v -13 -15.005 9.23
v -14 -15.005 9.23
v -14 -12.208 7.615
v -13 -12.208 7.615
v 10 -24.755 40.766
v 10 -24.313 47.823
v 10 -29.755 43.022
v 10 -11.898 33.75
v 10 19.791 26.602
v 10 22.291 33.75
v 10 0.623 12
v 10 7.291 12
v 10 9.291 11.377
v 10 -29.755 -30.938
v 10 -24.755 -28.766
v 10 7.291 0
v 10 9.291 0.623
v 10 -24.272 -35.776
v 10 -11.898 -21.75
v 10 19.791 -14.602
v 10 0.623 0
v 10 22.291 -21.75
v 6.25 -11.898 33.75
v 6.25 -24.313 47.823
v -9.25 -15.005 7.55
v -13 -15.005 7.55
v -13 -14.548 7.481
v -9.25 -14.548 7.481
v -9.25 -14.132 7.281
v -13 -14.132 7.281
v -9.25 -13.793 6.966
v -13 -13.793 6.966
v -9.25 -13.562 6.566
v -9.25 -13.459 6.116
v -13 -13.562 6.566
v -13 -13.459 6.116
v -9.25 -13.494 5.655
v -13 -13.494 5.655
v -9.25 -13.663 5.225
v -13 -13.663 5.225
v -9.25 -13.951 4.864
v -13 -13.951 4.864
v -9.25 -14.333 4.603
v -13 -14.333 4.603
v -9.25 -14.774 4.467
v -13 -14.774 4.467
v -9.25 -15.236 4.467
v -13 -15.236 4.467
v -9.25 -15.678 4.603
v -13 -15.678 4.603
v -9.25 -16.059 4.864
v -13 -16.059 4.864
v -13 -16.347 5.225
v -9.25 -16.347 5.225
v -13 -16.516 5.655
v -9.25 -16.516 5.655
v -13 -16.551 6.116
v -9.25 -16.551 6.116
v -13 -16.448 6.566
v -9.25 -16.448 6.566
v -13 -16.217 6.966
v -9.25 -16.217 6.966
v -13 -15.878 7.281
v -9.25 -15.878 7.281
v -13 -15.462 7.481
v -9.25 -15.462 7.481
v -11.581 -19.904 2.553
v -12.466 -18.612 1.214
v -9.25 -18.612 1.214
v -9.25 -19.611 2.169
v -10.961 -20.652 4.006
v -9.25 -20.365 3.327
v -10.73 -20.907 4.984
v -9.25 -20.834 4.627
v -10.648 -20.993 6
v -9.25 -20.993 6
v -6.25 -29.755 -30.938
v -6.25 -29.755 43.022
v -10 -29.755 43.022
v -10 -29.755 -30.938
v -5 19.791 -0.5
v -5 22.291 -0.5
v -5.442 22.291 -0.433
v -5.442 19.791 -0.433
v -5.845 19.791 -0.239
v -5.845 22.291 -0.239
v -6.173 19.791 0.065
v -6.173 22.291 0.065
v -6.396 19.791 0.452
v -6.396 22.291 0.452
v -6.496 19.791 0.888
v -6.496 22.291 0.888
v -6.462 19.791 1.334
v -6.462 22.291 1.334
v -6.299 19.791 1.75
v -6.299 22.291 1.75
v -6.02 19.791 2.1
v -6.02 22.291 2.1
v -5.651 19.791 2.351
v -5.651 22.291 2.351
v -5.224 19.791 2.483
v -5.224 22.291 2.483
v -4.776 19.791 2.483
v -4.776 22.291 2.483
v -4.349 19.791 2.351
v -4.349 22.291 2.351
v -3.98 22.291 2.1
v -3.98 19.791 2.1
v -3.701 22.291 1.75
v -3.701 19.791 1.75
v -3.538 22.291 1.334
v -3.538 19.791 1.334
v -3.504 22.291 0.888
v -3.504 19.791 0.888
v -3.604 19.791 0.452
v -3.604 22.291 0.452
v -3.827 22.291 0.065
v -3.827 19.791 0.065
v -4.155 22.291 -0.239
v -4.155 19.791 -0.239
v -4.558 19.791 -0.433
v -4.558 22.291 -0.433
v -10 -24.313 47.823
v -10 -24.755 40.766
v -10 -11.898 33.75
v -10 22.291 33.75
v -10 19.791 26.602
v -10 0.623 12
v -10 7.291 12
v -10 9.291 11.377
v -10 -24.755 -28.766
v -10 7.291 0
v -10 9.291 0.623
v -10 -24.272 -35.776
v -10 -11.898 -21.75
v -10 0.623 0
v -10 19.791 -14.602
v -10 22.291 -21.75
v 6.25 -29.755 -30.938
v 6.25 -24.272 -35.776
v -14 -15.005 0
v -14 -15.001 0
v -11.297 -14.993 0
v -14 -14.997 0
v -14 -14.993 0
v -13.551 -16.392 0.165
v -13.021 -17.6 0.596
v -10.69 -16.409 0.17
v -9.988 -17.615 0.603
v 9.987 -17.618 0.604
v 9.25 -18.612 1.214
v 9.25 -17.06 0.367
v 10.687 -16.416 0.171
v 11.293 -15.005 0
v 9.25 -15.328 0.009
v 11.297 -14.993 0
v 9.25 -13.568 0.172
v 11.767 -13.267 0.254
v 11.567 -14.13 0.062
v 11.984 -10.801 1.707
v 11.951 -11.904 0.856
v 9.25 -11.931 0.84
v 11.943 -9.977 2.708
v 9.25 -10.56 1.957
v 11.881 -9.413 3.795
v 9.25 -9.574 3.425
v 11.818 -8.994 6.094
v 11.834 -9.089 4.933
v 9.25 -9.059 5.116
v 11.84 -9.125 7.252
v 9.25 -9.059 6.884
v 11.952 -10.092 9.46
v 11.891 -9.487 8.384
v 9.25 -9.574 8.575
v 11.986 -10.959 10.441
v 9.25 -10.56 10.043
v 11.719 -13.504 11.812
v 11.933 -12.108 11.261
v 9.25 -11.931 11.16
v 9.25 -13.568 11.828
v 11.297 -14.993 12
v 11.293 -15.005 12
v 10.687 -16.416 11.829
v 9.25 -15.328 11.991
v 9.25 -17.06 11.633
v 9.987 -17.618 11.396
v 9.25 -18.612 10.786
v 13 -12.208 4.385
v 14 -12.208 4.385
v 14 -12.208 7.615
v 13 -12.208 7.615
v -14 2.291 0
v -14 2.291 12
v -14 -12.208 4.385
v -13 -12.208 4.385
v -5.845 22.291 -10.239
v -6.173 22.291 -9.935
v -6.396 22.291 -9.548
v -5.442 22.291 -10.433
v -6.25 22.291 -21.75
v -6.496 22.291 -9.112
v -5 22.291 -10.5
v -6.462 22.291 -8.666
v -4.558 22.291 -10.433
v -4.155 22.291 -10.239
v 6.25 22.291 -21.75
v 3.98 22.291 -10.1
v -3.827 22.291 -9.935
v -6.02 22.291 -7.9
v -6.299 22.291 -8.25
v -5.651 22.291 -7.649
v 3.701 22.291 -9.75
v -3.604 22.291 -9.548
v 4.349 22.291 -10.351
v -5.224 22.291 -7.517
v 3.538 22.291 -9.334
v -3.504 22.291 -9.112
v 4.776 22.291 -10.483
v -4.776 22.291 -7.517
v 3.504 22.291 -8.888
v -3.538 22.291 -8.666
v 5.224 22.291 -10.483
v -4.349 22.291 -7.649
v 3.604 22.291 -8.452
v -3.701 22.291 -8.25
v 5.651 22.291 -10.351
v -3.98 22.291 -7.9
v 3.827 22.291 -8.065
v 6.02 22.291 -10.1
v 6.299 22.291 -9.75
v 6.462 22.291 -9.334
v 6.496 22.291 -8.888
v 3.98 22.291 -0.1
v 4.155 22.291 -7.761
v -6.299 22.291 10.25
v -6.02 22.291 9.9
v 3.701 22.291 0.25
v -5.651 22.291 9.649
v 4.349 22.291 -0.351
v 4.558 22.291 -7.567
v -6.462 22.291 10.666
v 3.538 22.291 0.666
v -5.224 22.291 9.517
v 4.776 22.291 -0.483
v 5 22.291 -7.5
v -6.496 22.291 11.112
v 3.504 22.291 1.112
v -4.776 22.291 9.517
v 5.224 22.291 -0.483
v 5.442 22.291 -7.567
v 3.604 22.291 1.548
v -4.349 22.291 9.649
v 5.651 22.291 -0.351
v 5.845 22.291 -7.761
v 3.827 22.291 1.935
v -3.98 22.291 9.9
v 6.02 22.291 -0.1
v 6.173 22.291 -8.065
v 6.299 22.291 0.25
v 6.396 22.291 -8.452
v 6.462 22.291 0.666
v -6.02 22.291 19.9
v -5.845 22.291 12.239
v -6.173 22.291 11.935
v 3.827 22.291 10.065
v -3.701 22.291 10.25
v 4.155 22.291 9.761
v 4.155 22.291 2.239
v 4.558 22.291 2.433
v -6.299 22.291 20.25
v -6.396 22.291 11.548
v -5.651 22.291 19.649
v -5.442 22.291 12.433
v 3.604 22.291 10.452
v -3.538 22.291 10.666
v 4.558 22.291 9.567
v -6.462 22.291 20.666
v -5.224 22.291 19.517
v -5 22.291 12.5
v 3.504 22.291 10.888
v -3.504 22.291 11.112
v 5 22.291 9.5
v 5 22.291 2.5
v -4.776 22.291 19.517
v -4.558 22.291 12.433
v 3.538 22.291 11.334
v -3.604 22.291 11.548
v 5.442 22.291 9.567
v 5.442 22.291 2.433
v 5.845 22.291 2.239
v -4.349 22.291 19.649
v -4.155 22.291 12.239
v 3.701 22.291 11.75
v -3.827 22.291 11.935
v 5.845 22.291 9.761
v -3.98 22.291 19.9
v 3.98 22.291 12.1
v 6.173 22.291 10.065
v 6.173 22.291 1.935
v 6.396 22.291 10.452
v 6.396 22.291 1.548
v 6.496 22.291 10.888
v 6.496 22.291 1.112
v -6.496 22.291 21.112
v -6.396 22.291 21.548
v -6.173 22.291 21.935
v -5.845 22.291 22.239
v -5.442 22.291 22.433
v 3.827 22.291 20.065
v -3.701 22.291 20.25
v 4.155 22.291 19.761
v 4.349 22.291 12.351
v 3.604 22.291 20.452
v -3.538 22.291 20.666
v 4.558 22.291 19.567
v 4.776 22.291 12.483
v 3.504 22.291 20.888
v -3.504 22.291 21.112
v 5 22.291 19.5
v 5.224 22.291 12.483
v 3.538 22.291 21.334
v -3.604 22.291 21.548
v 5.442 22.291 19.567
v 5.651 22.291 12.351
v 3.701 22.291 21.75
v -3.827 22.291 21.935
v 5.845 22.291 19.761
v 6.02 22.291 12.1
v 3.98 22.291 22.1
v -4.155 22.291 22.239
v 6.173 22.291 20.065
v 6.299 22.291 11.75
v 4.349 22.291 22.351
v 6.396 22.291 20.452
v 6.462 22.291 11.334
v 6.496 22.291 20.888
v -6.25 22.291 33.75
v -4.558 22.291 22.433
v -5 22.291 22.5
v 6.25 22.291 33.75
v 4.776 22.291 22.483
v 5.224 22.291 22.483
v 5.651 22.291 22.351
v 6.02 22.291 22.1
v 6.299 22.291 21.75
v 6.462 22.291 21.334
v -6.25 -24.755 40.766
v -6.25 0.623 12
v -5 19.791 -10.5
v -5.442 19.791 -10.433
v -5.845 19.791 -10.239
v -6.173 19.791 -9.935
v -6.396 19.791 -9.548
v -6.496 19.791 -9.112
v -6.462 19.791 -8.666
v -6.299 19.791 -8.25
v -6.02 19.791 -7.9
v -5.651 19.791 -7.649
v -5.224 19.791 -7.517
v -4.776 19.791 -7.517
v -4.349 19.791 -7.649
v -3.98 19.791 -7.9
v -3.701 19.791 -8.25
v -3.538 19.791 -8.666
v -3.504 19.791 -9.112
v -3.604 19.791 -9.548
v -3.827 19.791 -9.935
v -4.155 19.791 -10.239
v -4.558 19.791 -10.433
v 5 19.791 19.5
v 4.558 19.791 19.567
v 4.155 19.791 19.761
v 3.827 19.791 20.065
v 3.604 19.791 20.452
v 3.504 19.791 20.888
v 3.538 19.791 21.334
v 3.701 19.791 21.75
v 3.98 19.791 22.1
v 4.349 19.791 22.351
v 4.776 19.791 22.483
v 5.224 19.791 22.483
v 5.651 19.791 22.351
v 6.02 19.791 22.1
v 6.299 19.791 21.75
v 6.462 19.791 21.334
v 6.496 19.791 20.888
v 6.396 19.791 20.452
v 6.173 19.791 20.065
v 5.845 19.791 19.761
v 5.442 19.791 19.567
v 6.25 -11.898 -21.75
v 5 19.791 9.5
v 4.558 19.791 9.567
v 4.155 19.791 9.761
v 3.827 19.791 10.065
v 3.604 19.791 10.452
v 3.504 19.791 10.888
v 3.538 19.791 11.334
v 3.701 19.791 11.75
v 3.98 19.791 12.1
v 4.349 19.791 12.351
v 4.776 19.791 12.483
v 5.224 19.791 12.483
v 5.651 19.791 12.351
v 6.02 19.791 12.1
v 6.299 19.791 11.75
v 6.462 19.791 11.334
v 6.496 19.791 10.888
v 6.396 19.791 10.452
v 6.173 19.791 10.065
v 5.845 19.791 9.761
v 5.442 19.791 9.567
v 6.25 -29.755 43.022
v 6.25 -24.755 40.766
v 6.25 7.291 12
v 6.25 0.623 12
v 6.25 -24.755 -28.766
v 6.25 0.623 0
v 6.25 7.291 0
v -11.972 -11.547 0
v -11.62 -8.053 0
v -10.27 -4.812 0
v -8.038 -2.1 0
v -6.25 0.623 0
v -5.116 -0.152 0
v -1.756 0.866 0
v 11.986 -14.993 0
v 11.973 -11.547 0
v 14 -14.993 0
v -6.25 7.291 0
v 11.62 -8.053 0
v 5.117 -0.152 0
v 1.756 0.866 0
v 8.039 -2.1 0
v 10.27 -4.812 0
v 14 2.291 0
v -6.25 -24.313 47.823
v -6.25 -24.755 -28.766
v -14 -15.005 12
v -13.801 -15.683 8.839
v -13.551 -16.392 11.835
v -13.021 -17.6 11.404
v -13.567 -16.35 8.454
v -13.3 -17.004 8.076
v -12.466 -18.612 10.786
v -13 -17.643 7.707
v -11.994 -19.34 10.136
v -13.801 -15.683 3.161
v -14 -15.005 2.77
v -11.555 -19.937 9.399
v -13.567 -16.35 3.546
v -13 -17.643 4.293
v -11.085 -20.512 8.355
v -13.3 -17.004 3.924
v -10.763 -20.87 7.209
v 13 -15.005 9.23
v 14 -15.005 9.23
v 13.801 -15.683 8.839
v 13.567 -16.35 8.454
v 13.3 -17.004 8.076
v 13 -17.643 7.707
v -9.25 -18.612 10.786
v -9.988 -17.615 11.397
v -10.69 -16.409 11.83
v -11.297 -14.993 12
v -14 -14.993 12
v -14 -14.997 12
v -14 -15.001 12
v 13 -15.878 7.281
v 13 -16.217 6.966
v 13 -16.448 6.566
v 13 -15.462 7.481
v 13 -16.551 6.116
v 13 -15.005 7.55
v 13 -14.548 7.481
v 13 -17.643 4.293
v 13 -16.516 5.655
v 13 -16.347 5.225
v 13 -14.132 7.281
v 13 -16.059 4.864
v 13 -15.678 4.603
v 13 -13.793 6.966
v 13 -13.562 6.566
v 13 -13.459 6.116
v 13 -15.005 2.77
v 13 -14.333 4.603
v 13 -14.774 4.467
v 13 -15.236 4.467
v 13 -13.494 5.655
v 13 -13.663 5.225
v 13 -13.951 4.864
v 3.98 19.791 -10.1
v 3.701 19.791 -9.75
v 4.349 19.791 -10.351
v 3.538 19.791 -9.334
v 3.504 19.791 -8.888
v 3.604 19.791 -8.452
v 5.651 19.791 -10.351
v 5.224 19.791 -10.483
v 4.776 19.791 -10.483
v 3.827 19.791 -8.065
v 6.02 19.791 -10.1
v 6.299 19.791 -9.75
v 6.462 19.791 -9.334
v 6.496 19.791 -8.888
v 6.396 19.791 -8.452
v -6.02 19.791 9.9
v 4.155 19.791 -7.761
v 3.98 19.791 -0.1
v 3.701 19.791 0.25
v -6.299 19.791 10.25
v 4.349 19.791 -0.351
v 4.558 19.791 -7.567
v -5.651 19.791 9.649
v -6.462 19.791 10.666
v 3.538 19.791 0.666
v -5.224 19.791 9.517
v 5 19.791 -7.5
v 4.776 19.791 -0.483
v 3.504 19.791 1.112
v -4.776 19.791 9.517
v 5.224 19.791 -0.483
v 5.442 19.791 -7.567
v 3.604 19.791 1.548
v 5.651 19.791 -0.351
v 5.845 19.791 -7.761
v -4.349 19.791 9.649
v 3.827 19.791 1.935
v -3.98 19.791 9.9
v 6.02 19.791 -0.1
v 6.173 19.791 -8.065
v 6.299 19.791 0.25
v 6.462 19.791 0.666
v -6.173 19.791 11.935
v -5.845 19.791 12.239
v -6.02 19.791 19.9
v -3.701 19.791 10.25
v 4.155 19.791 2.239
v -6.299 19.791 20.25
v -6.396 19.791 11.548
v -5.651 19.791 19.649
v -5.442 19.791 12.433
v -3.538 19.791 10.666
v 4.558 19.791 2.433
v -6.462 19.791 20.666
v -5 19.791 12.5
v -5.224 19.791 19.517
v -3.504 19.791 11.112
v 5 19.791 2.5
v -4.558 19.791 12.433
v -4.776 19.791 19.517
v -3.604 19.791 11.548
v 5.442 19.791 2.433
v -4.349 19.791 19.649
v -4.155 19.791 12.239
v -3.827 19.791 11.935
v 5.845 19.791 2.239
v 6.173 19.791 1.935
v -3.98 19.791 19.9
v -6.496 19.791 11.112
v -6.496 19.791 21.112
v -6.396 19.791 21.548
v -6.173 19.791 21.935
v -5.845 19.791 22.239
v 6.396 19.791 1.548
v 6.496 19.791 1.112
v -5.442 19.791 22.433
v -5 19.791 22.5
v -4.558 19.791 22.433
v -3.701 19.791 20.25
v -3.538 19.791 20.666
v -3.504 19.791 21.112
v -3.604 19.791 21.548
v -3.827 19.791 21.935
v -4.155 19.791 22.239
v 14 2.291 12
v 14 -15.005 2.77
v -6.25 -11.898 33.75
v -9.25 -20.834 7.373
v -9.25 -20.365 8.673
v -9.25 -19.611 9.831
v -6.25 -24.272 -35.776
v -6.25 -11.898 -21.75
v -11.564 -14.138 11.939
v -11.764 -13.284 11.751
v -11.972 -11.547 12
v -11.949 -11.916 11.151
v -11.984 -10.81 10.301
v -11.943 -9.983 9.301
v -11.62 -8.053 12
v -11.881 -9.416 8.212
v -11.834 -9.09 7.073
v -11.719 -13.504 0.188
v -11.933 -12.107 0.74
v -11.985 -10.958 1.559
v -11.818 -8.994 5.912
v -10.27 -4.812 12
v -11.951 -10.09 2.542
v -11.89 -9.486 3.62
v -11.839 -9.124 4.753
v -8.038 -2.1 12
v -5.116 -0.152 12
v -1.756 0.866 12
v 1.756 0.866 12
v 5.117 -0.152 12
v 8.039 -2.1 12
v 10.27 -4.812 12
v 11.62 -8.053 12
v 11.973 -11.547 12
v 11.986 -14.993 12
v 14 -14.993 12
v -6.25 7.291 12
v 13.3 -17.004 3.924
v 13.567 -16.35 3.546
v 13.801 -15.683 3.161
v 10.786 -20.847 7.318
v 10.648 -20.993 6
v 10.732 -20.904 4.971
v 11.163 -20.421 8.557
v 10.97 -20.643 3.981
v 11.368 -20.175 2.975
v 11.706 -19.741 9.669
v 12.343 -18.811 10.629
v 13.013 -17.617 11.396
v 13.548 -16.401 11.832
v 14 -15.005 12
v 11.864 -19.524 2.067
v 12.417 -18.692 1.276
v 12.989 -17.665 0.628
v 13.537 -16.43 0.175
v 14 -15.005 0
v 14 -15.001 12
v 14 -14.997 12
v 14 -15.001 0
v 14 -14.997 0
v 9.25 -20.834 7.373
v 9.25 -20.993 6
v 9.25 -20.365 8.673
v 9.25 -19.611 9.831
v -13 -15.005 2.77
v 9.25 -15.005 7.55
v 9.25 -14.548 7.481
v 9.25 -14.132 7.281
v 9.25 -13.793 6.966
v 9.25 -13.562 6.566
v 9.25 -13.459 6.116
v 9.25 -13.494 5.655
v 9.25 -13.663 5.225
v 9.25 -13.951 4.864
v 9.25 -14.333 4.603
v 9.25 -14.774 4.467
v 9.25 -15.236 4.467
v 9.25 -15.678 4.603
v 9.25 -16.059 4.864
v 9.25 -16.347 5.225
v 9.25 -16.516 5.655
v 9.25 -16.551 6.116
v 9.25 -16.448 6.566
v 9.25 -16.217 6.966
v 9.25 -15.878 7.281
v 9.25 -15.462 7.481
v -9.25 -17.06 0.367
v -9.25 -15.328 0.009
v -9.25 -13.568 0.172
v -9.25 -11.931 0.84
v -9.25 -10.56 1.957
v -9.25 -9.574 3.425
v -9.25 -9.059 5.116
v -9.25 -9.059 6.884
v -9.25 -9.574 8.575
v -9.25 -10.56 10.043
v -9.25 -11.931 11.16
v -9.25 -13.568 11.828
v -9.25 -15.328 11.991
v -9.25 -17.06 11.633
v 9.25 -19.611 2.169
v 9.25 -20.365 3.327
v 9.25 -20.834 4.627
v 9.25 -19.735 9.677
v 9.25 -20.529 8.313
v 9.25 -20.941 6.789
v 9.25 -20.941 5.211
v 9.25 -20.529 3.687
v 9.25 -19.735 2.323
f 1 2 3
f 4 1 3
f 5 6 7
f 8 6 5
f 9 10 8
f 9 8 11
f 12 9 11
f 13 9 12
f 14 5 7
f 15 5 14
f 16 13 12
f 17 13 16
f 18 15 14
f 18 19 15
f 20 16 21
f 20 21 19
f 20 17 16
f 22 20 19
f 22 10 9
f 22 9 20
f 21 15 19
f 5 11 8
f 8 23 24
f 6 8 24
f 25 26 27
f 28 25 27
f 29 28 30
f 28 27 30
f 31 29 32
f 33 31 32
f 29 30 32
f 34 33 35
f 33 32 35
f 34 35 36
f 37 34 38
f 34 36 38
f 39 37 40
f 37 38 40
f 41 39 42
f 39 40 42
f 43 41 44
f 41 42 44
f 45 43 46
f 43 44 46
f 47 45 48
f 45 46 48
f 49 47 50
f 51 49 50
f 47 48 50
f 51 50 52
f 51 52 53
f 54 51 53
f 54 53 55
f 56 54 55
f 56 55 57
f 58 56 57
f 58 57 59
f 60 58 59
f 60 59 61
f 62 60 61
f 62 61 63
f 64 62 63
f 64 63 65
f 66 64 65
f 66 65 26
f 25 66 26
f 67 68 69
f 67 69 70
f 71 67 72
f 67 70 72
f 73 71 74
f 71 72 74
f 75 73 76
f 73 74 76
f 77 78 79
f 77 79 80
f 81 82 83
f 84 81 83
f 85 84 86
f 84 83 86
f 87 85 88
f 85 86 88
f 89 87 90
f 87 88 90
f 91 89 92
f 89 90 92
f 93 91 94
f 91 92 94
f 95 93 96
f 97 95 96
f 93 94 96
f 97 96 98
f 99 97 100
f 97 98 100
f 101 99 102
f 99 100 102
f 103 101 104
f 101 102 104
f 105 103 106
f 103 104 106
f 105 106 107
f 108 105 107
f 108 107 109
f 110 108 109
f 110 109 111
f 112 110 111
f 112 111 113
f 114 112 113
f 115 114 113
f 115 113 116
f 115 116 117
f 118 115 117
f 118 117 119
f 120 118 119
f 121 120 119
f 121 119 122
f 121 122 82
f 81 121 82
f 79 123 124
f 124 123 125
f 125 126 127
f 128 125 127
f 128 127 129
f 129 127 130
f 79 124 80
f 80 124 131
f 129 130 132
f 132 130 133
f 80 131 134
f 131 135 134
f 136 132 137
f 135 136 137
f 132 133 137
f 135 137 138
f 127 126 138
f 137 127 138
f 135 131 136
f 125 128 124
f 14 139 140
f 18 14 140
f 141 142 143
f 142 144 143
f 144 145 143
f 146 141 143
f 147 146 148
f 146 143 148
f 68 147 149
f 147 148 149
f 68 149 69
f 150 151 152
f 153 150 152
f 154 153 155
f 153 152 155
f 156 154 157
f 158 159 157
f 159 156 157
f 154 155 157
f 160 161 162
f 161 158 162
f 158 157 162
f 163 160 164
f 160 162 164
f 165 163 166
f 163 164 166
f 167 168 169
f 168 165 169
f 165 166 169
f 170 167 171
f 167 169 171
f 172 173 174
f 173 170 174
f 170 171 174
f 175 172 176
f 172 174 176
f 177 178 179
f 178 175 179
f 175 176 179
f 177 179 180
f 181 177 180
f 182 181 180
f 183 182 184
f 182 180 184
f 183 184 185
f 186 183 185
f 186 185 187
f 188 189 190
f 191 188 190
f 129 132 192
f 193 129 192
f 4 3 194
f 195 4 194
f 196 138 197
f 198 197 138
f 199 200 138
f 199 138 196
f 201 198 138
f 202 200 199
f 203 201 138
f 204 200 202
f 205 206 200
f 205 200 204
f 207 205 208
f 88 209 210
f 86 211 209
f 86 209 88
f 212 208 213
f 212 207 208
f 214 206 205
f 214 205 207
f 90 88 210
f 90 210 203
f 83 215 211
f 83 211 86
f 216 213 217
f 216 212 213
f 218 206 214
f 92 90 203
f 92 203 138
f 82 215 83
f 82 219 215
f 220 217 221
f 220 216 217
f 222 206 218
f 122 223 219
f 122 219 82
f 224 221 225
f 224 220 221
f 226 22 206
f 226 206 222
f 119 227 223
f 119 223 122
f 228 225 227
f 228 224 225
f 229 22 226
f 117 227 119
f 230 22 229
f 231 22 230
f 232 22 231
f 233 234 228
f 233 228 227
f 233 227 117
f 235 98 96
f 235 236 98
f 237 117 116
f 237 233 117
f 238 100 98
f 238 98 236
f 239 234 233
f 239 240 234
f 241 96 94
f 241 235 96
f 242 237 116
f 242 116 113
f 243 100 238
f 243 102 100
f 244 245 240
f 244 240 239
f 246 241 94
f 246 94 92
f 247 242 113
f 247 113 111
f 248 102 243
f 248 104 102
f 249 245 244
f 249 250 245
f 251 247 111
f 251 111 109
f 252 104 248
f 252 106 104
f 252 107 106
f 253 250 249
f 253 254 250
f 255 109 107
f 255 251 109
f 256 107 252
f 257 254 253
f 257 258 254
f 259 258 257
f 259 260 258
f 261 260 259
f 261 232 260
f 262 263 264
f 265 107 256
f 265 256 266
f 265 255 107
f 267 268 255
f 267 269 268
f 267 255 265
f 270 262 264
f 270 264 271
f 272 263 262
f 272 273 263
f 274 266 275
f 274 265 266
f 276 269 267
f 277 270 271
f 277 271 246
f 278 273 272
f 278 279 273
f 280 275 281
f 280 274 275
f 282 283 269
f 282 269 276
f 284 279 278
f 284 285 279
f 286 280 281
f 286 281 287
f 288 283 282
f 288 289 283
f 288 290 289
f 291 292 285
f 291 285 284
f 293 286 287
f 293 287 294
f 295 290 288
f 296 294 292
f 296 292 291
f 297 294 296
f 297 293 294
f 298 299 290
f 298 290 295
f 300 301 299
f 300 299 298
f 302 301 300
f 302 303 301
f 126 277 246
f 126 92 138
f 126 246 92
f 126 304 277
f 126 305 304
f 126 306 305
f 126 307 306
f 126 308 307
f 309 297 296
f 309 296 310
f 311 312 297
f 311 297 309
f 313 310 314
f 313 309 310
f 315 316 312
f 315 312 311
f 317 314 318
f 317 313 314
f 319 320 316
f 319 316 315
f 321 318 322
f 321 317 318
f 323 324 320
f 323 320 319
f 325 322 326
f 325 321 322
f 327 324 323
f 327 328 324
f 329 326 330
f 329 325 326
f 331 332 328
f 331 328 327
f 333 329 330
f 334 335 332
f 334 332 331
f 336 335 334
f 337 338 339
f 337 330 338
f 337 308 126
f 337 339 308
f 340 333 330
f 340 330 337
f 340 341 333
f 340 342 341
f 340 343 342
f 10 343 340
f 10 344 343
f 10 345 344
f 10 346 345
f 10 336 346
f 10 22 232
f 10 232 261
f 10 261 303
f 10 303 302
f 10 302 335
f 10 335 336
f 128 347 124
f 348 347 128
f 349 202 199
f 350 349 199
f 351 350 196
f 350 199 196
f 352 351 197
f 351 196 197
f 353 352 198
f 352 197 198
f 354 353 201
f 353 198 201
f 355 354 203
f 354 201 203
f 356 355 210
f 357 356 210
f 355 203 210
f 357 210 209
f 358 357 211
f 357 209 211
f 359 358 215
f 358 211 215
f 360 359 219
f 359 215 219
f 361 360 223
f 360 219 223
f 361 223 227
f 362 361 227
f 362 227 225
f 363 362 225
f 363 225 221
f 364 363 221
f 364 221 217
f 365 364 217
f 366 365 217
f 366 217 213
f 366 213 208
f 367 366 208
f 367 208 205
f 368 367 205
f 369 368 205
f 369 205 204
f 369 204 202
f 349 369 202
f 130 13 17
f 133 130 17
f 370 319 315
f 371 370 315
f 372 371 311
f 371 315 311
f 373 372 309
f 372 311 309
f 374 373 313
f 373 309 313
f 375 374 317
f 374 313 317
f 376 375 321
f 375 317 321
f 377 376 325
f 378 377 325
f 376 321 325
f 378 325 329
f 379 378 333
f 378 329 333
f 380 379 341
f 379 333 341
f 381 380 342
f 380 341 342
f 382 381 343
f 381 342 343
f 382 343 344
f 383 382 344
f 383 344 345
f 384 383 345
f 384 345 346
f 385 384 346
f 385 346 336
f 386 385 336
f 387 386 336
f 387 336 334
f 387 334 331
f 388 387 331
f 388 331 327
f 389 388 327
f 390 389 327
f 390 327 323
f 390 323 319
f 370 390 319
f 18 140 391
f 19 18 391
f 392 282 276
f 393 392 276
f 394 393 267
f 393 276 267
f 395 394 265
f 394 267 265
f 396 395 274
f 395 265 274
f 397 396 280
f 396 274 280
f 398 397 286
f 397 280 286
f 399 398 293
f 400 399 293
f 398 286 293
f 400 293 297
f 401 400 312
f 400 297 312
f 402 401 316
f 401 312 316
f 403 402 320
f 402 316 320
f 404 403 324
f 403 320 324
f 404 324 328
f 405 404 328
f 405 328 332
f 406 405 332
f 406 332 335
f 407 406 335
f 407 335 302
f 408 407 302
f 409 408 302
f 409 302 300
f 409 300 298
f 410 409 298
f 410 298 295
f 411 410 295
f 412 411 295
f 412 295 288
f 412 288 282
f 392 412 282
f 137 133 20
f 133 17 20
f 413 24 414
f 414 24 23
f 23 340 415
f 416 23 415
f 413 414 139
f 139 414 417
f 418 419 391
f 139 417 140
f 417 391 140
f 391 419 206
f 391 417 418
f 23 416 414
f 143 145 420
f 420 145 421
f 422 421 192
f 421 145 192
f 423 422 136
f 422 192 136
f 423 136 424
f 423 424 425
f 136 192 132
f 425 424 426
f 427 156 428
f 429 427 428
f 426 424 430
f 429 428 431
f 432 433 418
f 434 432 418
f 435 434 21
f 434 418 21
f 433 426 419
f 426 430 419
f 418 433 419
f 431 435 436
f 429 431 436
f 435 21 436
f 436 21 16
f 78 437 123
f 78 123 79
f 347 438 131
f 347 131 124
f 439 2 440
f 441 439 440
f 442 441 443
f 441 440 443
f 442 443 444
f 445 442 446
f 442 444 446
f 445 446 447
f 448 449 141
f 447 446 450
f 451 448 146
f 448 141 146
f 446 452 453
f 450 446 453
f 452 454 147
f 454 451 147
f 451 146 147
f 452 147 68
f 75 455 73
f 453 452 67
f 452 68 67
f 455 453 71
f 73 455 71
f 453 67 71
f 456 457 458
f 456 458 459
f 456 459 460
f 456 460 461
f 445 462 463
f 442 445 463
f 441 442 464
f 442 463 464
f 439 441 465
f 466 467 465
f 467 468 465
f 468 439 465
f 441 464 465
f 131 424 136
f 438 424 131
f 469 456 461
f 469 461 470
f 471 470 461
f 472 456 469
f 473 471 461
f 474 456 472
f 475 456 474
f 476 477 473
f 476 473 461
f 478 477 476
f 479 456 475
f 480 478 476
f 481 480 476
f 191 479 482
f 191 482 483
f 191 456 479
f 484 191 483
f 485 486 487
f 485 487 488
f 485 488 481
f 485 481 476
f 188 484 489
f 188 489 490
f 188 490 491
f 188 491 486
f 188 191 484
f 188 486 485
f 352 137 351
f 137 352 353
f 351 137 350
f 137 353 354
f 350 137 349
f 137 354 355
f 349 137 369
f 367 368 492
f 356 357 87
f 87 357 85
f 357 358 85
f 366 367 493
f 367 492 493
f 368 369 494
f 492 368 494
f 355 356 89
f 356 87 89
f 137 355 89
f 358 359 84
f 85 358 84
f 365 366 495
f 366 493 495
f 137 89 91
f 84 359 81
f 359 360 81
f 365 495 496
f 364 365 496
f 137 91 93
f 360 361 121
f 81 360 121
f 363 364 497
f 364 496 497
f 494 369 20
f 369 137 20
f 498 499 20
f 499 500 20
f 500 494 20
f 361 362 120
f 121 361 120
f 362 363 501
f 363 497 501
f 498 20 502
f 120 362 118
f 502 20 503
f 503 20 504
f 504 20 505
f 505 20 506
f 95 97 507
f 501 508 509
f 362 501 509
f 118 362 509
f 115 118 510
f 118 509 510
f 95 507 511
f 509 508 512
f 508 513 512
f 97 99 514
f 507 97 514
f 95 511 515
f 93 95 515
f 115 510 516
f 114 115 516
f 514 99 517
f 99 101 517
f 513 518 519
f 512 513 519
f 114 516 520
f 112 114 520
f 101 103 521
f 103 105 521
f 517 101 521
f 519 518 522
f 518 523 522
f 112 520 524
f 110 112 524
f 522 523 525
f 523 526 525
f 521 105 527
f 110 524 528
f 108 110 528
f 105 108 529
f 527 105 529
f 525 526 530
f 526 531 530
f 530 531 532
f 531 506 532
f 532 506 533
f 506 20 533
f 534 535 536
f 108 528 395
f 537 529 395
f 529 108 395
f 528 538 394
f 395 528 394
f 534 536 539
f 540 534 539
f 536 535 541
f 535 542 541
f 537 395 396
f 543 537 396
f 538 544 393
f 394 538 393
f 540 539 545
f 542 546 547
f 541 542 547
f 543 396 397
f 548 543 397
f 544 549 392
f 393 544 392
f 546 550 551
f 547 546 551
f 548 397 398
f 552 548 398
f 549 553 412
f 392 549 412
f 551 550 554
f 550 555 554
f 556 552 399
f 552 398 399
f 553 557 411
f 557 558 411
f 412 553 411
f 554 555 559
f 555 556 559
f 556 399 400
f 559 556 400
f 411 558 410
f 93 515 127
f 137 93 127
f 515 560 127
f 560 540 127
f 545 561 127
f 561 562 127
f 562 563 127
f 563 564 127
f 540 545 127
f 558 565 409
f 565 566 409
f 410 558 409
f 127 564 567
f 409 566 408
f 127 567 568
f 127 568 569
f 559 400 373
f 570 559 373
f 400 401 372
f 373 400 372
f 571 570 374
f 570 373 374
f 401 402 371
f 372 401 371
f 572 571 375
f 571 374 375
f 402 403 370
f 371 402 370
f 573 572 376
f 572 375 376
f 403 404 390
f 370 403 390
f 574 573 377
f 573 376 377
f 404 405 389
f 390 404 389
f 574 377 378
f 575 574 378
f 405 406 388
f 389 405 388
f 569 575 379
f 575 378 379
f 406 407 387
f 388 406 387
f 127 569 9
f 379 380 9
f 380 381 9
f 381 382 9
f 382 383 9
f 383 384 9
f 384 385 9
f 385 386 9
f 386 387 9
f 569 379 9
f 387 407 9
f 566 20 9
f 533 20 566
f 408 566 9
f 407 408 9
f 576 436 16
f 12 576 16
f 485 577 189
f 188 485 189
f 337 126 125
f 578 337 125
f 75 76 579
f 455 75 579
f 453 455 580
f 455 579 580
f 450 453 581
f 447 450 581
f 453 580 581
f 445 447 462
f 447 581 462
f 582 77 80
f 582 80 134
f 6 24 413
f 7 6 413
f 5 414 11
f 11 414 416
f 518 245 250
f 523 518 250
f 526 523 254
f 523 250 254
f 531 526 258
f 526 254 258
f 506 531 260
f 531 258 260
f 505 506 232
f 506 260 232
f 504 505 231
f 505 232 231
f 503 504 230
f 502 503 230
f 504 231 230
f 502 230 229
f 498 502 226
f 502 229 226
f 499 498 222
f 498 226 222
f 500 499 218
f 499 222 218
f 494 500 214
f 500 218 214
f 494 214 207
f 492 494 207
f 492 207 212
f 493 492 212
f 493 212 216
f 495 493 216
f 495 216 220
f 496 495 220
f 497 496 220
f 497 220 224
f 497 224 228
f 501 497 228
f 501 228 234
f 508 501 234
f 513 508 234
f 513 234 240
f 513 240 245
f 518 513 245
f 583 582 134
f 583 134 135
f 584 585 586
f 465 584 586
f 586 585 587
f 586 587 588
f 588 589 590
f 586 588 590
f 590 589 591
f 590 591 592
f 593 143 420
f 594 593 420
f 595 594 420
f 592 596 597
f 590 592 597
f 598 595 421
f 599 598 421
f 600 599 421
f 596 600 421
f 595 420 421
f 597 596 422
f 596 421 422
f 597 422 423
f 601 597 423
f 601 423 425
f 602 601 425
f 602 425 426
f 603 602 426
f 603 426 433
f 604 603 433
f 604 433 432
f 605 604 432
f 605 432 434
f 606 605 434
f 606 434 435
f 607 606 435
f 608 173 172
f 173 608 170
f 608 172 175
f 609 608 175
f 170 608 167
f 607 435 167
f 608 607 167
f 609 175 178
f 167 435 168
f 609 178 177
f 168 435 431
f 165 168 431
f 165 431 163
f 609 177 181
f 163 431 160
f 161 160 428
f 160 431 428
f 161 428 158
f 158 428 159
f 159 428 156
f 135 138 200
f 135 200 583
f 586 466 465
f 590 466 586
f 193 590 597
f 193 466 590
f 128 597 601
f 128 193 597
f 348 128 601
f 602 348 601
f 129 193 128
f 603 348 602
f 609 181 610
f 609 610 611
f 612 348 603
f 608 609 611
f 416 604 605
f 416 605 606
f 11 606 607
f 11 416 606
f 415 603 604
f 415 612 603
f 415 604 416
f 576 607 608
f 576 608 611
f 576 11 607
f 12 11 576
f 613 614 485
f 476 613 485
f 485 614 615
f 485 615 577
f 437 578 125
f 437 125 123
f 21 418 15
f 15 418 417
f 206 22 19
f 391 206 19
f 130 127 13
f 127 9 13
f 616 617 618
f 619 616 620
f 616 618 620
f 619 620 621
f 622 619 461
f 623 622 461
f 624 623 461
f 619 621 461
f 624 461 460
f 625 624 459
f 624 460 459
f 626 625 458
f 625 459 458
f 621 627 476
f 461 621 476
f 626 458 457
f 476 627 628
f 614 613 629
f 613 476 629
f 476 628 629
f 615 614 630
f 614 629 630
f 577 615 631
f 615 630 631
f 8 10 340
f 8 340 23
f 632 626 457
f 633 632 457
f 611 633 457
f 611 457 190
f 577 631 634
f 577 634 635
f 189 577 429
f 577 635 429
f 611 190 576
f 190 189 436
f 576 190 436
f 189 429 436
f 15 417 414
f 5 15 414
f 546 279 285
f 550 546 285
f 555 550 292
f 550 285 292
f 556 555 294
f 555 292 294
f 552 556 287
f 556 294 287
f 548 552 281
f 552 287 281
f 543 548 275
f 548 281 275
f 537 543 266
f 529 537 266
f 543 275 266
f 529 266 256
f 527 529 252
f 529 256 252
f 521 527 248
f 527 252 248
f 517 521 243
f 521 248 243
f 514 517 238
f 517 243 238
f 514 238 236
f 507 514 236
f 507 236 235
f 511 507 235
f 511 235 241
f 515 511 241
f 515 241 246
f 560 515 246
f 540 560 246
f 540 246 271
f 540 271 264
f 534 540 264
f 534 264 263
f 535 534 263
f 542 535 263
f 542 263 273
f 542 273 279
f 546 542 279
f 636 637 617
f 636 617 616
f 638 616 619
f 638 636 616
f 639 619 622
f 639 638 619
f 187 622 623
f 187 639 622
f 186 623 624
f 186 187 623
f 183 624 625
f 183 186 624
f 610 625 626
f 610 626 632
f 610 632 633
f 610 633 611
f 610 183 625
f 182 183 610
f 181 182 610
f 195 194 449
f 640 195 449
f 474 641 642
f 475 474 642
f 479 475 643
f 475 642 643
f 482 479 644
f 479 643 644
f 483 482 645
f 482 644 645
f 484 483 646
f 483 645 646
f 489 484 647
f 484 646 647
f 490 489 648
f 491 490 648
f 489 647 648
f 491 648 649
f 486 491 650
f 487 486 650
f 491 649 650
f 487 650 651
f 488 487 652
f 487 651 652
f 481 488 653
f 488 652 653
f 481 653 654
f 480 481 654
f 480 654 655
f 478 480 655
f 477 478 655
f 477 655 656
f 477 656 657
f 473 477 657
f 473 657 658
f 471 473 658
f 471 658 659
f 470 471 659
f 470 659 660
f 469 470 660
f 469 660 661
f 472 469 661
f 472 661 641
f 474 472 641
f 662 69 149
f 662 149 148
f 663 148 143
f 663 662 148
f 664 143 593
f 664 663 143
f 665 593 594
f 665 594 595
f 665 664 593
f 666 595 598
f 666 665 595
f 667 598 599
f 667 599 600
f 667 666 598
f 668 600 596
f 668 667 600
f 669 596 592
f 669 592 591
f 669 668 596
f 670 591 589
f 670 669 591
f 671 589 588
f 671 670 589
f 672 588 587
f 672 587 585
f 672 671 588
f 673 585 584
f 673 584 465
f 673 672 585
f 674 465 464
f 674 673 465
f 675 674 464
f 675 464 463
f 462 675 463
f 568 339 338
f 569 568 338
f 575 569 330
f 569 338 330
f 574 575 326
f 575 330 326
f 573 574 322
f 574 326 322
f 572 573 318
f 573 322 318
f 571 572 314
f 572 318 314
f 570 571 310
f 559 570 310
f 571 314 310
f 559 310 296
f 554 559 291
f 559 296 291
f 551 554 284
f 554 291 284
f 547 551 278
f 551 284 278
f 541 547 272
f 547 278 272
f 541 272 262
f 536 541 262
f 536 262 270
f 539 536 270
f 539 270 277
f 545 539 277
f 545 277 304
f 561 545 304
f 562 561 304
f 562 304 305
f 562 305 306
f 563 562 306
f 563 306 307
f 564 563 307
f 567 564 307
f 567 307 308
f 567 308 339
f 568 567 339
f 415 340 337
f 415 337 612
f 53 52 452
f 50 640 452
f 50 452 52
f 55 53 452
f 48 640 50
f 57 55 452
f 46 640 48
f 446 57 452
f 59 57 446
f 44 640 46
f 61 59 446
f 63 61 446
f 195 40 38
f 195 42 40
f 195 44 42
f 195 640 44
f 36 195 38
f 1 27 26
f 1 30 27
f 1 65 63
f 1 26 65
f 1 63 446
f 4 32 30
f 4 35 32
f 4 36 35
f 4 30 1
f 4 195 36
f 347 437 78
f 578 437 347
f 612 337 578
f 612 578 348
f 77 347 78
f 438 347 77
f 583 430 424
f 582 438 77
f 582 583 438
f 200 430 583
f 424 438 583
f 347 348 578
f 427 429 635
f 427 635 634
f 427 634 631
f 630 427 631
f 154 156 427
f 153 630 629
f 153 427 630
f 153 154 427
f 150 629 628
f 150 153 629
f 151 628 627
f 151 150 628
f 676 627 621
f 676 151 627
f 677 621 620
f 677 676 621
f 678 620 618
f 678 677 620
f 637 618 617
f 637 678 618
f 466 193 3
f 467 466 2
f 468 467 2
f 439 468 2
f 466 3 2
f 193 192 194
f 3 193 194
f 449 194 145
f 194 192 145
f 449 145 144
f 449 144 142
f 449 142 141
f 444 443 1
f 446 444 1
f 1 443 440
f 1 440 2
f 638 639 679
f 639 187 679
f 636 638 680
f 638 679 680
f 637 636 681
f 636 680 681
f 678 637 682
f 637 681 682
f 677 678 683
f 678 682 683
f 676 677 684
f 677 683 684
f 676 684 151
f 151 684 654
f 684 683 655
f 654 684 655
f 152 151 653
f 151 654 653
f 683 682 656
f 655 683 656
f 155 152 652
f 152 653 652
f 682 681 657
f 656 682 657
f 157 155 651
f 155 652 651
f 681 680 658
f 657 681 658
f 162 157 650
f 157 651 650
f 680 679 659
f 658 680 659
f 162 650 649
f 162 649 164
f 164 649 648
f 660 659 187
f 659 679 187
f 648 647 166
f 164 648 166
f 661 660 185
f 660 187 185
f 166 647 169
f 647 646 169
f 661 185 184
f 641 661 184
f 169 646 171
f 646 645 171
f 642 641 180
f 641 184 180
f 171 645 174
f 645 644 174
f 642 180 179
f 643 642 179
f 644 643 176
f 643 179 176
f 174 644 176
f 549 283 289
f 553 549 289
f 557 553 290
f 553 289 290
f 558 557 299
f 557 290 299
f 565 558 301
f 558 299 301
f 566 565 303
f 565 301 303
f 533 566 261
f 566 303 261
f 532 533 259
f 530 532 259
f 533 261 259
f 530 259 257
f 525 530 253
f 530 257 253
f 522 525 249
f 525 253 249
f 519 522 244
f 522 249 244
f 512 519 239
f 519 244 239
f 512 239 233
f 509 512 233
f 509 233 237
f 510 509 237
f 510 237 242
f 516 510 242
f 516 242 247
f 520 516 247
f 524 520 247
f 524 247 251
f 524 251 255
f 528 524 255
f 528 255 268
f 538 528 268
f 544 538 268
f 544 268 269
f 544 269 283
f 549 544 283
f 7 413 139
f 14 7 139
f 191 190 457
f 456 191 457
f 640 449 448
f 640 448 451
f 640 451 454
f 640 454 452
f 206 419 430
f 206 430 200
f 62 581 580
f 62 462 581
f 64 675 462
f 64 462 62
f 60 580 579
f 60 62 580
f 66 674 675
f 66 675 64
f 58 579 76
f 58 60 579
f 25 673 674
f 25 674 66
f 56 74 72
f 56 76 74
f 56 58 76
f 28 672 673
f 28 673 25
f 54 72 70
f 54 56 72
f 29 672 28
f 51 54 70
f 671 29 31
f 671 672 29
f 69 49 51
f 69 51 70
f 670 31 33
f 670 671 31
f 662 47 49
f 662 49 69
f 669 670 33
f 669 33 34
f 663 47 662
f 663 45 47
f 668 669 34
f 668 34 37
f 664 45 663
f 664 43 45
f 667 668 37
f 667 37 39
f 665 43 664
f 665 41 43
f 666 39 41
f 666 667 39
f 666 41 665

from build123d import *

# Parameters (mm, degrees)
EXTRUDE_1_DEPTH      = 12
EXTRUDE_2_REACH      = 35.545
EXTRUDE_2_END_RADIUS = 11.985372339
SKETCH_2_R           = 6
MIRROR_START         = 9.249795062
MIRROR_1_DEPTH       = 2.735782315
MIRROR_1_2_DEPTH     = 0.000409876
CUT_EXTRUDE_1_DEPTH  = 34.545141776
CUT_EXTRUDE_2_DEPTH  = 1
CUT_EXTRUDE_3_DEPTH  = 1
MIRROR_START_2       = 9.250204938
MIRROR_3_DEPTH       = 5.749795062
SKETCH_6_R           = 1.55
CUT_EXTRUDE_4_DEPTH  = 37.245193425
SKETCH_12_W          = 20
SKETCH_12_H          = 12
EXTRUDE_4_DEPTH      = 5
EXTRUDE_5_DEPTH      = 10
EXTRUDE_6_DEPTH      = 12
EXTRUDE_7_DEPTH      = 3.75
EXTRUDE_8_DEPTH      = 3.75
SKETCH_21_R          = 1.5
CUT_EXTRUDE_5_DEPTH  = 3


with BuildPart() as part:
    # 스케치1 → 보스-돌출1 (new body)
    with BuildSketch(Plane.XY):
        with BuildLine():
            Line((14.000204938, 2.291069809), (-13.999795062, 2.291069809))
            Line((-13.999795062, 2.291069809), (-13.999795062, -6.939240191))
            Line((-13.999795062, -6.939240191), (-13.999795062, -15.005030191))
            ThreePointArc((-13.999795062, -15.005030191), (-12.699794, -18.209549332), (-10.647895062, -20.993190191))
            Line((-10.647895062, -20.993190191), (-9.249795062, -20.993190191))
            Line((-9.249795062, -20.993190191), (-9.249795062, -18.61185417))
            ThreePointArc((-9.249795062, -18.61185417), (-10.428409882, -16.897436148), (-11.292795062, -15.005030191))
            ThreePointArc((-11.292795062, -15.005030191), (0.000204938, 0.99497801), (11.293204938, -15.005030191))
            ThreePointArc((11.293204938, -15.005030191), (10.428819757, -16.897436148), (9.250204938, -18.61185417))
            Line((9.250204938, -18.61185417), (9.250204938, -20.993190191))
            Line((9.250204938, -20.993190191), (10.648304938, -20.993190191))
            ThreePointArc((10.648304938, -20.993190191), (12.700203875, -18.209549332), (14.000204938, -15.005030191))
            Line((14.000204938, -15.005030191), (14.000204938, -6.939240191))
            Line((14.000204938, -6.939240191), (14.000204938, 2.291069809))
        make_face()
    extrude(amount=EXTRUDE_1_DEPTH)

    # 보스-돌출2: up to this cylinder (the profile starts inside it)
    extrude_2_end = Plane(origin=(0.000204938, -10.990394329, 6), z_dir=(0, 0, -1)) * Cylinder(EXTRUDE_2_END_RADIUS, 96.060744678, mode=Mode.PRIVATE)
    # 스케치2 → 보스-돌출2 (add, up to the surface)
    with BuildSketch(Plane(origin=(-9.249795062, 0, 0), x_dir=(0, 0, -1), z_dir=(1, 0, 0)), mode=Mode.PRIVATE) as extrude_2_sk1:
        with Locations((-6, -14.993190191)):
            Circle(SKETCH_2_R)
    extrude_2_tool1 = extrude(extrude_2_sk1.sketch, amount=-EXTRUDE_2_REACH, mode=Mode.PRIVATE) & extrude_2_end
    add(extrude_2_tool1.solids().sort_by_distance((-9.249795, -14.99319, 6))[0])

    # 대칭 복사1: read off the stored shape, not the designer's step
    # 대칭 복사1 outline → 대칭 복사1 (add)
    with BuildSketch(Plane.YZ.offset(MIRROR_START)):
        with BuildLine():
            ThreePointArc((-18.61185417, 1.214054847), (-8.993190191, 6), (-18.61185417, 10.785945153))
            Line((-18.61185417, 10.785945153), (-18.61185417, 1.214054847))
        make_face()
    extrude(amount=MIRROR_1_DEPTH)

    # Mirror 1 2 outline → Mirror 1 2 (add)
    with BuildSketch(Plane.YZ.offset(MIRROR_START)):
        with BuildLine():
            Line((-18.61185417, 1.214054847), (-18.61185417, 10.785945153))
            ThreePointArc((-18.61185417, 10.785945153), (-20.993190191, 6), (-18.61185417, 1.214054847))
        make_face()
    extrude(amount=MIRROR_1_2_DEPTH)

    # 스케치3 → 컷-돌출1 (cut, through all)
    with BuildSketch(Plane(origin=(-9.249795062, 0, 0), x_dir=(0, 0, -1), z_dir=(1, 0, 0))):
        with BuildLine():
            Line((-6, -20.993190191), (0, -20.993190191))
            Line((0, -20.993190191), (0, -18.61185417))
            Line((0, -18.61185417), (-1.214054847, -18.61185417))
            ThreePointArc((-1.214054847, -18.61185417), (-3.327172272, -20.364967545), (-6, -20.993190191))
        make_face()
        with BuildLine():
            Line((-12, -20.993190191), (-6, -20.993190191))
            ThreePointArc((-6, -20.993190191), (-8.672827728, -20.364967545), (-10.785945153, -18.61185417))
            Line((-10.785945153, -18.61185417), (-12, -18.61185417))
            Line((-12, -18.61185417), (-12, -20.993190191))
        make_face()
        with BuildLine():
            Line((-12, -18.61185417), (-10.785945153, -18.61185417))
            ThreePointArc((-10.785945153, -18.61185417), (-11.688394805, -16.901635773), (-12, -14.993190191))
            Line((-12, -14.993190191), (-12, -18.61185417))
        make_face()
        with BuildLine():
            Line((-1.214054847, -18.61185417), (0, -18.61185417))
            Line((0, -18.61185417), (0, -14.993190191))
            ThreePointArc((0, -14.993190191), (-0.311605195, -16.901635773), (-1.214054847, -18.61185417))
        make_face()
    extrude(amount=-CUT_EXTRUDE_1_DEPTH, mode=Mode.SUBTRACT)

    # 스케치4 → 컷-돌출2 (cut)
    with BuildSketch(Plane.ZY.offset(13.999795062)):
        Polygon((9.23, -15.005030191), (7.615, -12.207768137), (4.385, -12.207768137), (2.77, -15.005030191), (4.385, -17.802292245), (7.615, -17.802292245), align=None)
    extrude(amount=-CUT_EXTRUDE_2_DEPTH, mode=Mode.SUBTRACT)

    # 스케치5 → 컷-돌출3 (cut)
    with BuildSketch(Plane(origin=(14.000204938, 0, 0), x_dir=(0, 0, -1), z_dir=(1, 0, 0))):
        Polygon((-2.77, -15.005030191), (-4.385, -12.207768137), (-7.615, -12.207768137), (-9.23, -15.005030191), (-7.615, -17.802292245), (-4.385, -17.802292245), align=None)
    extrude(amount=-CUT_EXTRUDE_3_DEPTH, mode=Mode.SUBTRACT)

    # 대칭 복사3: read off the stored shape, not the designer's step
    # 대칭 복사3 outline → 대칭 복사3 (cut)
    with BuildSketch(Plane.YZ.offset(MIRROR_START_2)):
        with BuildLine():
            ThreePointArc((-20.993190191, 6), (-19.235830878, 10.242640687), (-14.993190191, 12))
            Line((-14.993190191, 12), (-20.993190191, 12))
            Line((-20.993190191, 12), (-20.993190191, 6))
        make_face()
        with BuildLine():
            Line((-20.993190191, 0), (-14.993190191, 0))
            ThreePointArc((-14.993190191, 0), (-19.235830878, 1.757359313), (-20.993190191, 6))
            Line((-20.993190191, 6), (-20.993190191, 0))
        make_face()
    extrude(amount=MIRROR_3_DEPTH, mode=Mode.SUBTRACT)

    # 스케치6 → 컷-돌출4 (cut, through all)
    with BuildSketch(Plane.ZY.offset(12.999795062)):
        with Locations((6, -15.005030191)):
            Circle(SKETCH_6_R)
    extrude(amount=-CUT_EXTRUDE_4_DEPTH, mode=Mode.SUBTRACT)

    # 스케치12 → 보스-돌출4 (add)
    with BuildSketch(Plane(origin=(0, 2.291069809, 0), x_dir=(1, 0, 0), z_dir=(0, 1, 0))):
        with Locations((0, -6)):
            Rectangle(SKETCH_12_W, SKETCH_12_H)
    extrude(amount=EXTRUDE_4_DEPTH)

    # 스케치14 → 보스-돌출5 (add, symmetric)
    with BuildSketch(Plane(origin=(0, 0, 0), x_dir=(0, 0, -1), z_dir=(1, 0, 0))):
        Polygon((-12, 7.291069809), (0, 7.291069809), (21.75, 22.291069809), (-33.75, 22.291069809), align=None)
        Polygon((-11.377217009, 9.291069809), (-0.622782991, 9.291069809), (14.602217009, 19.791069809), (-26.602217009, 19.791069809), align=None, mode=Mode.SUBTRACT)
    extrude(amount=EXTRUDE_5_DEPTH, both=True)

    # 스케치15 → 보스-돌출6 (add)
    with BuildSketch(Plane.XY.offset(12)):
        Polygon((-10, 7.291069809), (-13.999795062, 2.291069809), (-10, 2.291069809), align=None)
        Polygon((10, 2.291069809), (14.000204938, 2.291069809), (10, 7.291069809), align=None)
    extrude(amount=-EXTRUDE_6_DEPTH)

    # 스케치19 → 보스-돌출7 (add)
    with BuildSketch(Plane(origin=(6.25, 0, 0), x_dir=(0, 0, -1), z_dir=(1, 0, 0))):
        Polygon((-12, 7.291069809), (-47.823129142, -24.313497594), (-43.022395989, -29.755030191), (30.938064105, -29.755030191), (35.775707613, -24.271660464), (0, 7.291069809), (0, 0.623337928), (28.765859914, -24.755030191), (-40.765859914, -24.755030191), (-12, 0.623337928), align=None)
    extrude_7 = extrude(amount=EXTRUDE_7_DEPTH)

    # 대칭 복사4: 보스-돌출7 across plane
    add(extrude_7.mirror(Plane(origin=(0, 0, 0), x_dir=(0, 0, 1), z_dir=(1, 0, 0))))

    # 스케치20 → 보스-돌출8 (add)
    with BuildSketch(Plane(origin=(10, 0, 0), x_dir=(0, 0, -1), z_dir=(1, 0, 0))):
        Polygon((-12, 7.291069809), (-33.75, 22.291069809), (-33.75, -11.897631945), align=None)
        Polygon((21.75, 22.291069809), (21.75, -11.897631945), (0, 7.291069809), align=None)
    extrude_8 = extrude(amount=-EXTRUDE_8_DEPTH)

    # 대칭 복사5: 보스-돌출8 across plane
    add(extrude_8.mirror(Plane(origin=(0, 0, 0), x_dir=(0, 0, 1), z_dir=(1, 0, 0))))

    # 스케치21 → 컷-돌출5 (cut)
    with BuildSketch(Plane(origin=(0, 22.291069809, 0), x_dir=(1, 0, 0), z_dir=(0, 1, 0))):
        with Locations(Location((5, 9, 0), (0, 0, 270))):
            Circle(SKETCH_21_R)
        with Locations(Location((5, -1, 0), (0, 0, 270))):
            Circle(SKETCH_21_R)
        with Locations(Location((-5, 9, 0), (0, 0, 90))):
            Circle(SKETCH_21_R)
        with Locations(Location((-5, -1, 0), (0, 0, 90))):
            Circle(SKETCH_21_R)
        with Locations(Location((5, -11, 0), (0, 0, 90))):
            Circle(SKETCH_21_R)
        with Locations(Location((5, -21, 0), (0, 0, 90))):
            Circle(SKETCH_21_R)
        with Locations(Location((-5, -21, 0), (0, 0, 270))):
            Circle(SKETCH_21_R)
        with Locations(Location((-5, -11, 0), (0, 0, 270))):
            Circle(SKETCH_21_R)
    extrude(amount=-CUT_EXTRUDE_5_DEPTH, mode=Mode.SUBTRACT)


solid = part.part
